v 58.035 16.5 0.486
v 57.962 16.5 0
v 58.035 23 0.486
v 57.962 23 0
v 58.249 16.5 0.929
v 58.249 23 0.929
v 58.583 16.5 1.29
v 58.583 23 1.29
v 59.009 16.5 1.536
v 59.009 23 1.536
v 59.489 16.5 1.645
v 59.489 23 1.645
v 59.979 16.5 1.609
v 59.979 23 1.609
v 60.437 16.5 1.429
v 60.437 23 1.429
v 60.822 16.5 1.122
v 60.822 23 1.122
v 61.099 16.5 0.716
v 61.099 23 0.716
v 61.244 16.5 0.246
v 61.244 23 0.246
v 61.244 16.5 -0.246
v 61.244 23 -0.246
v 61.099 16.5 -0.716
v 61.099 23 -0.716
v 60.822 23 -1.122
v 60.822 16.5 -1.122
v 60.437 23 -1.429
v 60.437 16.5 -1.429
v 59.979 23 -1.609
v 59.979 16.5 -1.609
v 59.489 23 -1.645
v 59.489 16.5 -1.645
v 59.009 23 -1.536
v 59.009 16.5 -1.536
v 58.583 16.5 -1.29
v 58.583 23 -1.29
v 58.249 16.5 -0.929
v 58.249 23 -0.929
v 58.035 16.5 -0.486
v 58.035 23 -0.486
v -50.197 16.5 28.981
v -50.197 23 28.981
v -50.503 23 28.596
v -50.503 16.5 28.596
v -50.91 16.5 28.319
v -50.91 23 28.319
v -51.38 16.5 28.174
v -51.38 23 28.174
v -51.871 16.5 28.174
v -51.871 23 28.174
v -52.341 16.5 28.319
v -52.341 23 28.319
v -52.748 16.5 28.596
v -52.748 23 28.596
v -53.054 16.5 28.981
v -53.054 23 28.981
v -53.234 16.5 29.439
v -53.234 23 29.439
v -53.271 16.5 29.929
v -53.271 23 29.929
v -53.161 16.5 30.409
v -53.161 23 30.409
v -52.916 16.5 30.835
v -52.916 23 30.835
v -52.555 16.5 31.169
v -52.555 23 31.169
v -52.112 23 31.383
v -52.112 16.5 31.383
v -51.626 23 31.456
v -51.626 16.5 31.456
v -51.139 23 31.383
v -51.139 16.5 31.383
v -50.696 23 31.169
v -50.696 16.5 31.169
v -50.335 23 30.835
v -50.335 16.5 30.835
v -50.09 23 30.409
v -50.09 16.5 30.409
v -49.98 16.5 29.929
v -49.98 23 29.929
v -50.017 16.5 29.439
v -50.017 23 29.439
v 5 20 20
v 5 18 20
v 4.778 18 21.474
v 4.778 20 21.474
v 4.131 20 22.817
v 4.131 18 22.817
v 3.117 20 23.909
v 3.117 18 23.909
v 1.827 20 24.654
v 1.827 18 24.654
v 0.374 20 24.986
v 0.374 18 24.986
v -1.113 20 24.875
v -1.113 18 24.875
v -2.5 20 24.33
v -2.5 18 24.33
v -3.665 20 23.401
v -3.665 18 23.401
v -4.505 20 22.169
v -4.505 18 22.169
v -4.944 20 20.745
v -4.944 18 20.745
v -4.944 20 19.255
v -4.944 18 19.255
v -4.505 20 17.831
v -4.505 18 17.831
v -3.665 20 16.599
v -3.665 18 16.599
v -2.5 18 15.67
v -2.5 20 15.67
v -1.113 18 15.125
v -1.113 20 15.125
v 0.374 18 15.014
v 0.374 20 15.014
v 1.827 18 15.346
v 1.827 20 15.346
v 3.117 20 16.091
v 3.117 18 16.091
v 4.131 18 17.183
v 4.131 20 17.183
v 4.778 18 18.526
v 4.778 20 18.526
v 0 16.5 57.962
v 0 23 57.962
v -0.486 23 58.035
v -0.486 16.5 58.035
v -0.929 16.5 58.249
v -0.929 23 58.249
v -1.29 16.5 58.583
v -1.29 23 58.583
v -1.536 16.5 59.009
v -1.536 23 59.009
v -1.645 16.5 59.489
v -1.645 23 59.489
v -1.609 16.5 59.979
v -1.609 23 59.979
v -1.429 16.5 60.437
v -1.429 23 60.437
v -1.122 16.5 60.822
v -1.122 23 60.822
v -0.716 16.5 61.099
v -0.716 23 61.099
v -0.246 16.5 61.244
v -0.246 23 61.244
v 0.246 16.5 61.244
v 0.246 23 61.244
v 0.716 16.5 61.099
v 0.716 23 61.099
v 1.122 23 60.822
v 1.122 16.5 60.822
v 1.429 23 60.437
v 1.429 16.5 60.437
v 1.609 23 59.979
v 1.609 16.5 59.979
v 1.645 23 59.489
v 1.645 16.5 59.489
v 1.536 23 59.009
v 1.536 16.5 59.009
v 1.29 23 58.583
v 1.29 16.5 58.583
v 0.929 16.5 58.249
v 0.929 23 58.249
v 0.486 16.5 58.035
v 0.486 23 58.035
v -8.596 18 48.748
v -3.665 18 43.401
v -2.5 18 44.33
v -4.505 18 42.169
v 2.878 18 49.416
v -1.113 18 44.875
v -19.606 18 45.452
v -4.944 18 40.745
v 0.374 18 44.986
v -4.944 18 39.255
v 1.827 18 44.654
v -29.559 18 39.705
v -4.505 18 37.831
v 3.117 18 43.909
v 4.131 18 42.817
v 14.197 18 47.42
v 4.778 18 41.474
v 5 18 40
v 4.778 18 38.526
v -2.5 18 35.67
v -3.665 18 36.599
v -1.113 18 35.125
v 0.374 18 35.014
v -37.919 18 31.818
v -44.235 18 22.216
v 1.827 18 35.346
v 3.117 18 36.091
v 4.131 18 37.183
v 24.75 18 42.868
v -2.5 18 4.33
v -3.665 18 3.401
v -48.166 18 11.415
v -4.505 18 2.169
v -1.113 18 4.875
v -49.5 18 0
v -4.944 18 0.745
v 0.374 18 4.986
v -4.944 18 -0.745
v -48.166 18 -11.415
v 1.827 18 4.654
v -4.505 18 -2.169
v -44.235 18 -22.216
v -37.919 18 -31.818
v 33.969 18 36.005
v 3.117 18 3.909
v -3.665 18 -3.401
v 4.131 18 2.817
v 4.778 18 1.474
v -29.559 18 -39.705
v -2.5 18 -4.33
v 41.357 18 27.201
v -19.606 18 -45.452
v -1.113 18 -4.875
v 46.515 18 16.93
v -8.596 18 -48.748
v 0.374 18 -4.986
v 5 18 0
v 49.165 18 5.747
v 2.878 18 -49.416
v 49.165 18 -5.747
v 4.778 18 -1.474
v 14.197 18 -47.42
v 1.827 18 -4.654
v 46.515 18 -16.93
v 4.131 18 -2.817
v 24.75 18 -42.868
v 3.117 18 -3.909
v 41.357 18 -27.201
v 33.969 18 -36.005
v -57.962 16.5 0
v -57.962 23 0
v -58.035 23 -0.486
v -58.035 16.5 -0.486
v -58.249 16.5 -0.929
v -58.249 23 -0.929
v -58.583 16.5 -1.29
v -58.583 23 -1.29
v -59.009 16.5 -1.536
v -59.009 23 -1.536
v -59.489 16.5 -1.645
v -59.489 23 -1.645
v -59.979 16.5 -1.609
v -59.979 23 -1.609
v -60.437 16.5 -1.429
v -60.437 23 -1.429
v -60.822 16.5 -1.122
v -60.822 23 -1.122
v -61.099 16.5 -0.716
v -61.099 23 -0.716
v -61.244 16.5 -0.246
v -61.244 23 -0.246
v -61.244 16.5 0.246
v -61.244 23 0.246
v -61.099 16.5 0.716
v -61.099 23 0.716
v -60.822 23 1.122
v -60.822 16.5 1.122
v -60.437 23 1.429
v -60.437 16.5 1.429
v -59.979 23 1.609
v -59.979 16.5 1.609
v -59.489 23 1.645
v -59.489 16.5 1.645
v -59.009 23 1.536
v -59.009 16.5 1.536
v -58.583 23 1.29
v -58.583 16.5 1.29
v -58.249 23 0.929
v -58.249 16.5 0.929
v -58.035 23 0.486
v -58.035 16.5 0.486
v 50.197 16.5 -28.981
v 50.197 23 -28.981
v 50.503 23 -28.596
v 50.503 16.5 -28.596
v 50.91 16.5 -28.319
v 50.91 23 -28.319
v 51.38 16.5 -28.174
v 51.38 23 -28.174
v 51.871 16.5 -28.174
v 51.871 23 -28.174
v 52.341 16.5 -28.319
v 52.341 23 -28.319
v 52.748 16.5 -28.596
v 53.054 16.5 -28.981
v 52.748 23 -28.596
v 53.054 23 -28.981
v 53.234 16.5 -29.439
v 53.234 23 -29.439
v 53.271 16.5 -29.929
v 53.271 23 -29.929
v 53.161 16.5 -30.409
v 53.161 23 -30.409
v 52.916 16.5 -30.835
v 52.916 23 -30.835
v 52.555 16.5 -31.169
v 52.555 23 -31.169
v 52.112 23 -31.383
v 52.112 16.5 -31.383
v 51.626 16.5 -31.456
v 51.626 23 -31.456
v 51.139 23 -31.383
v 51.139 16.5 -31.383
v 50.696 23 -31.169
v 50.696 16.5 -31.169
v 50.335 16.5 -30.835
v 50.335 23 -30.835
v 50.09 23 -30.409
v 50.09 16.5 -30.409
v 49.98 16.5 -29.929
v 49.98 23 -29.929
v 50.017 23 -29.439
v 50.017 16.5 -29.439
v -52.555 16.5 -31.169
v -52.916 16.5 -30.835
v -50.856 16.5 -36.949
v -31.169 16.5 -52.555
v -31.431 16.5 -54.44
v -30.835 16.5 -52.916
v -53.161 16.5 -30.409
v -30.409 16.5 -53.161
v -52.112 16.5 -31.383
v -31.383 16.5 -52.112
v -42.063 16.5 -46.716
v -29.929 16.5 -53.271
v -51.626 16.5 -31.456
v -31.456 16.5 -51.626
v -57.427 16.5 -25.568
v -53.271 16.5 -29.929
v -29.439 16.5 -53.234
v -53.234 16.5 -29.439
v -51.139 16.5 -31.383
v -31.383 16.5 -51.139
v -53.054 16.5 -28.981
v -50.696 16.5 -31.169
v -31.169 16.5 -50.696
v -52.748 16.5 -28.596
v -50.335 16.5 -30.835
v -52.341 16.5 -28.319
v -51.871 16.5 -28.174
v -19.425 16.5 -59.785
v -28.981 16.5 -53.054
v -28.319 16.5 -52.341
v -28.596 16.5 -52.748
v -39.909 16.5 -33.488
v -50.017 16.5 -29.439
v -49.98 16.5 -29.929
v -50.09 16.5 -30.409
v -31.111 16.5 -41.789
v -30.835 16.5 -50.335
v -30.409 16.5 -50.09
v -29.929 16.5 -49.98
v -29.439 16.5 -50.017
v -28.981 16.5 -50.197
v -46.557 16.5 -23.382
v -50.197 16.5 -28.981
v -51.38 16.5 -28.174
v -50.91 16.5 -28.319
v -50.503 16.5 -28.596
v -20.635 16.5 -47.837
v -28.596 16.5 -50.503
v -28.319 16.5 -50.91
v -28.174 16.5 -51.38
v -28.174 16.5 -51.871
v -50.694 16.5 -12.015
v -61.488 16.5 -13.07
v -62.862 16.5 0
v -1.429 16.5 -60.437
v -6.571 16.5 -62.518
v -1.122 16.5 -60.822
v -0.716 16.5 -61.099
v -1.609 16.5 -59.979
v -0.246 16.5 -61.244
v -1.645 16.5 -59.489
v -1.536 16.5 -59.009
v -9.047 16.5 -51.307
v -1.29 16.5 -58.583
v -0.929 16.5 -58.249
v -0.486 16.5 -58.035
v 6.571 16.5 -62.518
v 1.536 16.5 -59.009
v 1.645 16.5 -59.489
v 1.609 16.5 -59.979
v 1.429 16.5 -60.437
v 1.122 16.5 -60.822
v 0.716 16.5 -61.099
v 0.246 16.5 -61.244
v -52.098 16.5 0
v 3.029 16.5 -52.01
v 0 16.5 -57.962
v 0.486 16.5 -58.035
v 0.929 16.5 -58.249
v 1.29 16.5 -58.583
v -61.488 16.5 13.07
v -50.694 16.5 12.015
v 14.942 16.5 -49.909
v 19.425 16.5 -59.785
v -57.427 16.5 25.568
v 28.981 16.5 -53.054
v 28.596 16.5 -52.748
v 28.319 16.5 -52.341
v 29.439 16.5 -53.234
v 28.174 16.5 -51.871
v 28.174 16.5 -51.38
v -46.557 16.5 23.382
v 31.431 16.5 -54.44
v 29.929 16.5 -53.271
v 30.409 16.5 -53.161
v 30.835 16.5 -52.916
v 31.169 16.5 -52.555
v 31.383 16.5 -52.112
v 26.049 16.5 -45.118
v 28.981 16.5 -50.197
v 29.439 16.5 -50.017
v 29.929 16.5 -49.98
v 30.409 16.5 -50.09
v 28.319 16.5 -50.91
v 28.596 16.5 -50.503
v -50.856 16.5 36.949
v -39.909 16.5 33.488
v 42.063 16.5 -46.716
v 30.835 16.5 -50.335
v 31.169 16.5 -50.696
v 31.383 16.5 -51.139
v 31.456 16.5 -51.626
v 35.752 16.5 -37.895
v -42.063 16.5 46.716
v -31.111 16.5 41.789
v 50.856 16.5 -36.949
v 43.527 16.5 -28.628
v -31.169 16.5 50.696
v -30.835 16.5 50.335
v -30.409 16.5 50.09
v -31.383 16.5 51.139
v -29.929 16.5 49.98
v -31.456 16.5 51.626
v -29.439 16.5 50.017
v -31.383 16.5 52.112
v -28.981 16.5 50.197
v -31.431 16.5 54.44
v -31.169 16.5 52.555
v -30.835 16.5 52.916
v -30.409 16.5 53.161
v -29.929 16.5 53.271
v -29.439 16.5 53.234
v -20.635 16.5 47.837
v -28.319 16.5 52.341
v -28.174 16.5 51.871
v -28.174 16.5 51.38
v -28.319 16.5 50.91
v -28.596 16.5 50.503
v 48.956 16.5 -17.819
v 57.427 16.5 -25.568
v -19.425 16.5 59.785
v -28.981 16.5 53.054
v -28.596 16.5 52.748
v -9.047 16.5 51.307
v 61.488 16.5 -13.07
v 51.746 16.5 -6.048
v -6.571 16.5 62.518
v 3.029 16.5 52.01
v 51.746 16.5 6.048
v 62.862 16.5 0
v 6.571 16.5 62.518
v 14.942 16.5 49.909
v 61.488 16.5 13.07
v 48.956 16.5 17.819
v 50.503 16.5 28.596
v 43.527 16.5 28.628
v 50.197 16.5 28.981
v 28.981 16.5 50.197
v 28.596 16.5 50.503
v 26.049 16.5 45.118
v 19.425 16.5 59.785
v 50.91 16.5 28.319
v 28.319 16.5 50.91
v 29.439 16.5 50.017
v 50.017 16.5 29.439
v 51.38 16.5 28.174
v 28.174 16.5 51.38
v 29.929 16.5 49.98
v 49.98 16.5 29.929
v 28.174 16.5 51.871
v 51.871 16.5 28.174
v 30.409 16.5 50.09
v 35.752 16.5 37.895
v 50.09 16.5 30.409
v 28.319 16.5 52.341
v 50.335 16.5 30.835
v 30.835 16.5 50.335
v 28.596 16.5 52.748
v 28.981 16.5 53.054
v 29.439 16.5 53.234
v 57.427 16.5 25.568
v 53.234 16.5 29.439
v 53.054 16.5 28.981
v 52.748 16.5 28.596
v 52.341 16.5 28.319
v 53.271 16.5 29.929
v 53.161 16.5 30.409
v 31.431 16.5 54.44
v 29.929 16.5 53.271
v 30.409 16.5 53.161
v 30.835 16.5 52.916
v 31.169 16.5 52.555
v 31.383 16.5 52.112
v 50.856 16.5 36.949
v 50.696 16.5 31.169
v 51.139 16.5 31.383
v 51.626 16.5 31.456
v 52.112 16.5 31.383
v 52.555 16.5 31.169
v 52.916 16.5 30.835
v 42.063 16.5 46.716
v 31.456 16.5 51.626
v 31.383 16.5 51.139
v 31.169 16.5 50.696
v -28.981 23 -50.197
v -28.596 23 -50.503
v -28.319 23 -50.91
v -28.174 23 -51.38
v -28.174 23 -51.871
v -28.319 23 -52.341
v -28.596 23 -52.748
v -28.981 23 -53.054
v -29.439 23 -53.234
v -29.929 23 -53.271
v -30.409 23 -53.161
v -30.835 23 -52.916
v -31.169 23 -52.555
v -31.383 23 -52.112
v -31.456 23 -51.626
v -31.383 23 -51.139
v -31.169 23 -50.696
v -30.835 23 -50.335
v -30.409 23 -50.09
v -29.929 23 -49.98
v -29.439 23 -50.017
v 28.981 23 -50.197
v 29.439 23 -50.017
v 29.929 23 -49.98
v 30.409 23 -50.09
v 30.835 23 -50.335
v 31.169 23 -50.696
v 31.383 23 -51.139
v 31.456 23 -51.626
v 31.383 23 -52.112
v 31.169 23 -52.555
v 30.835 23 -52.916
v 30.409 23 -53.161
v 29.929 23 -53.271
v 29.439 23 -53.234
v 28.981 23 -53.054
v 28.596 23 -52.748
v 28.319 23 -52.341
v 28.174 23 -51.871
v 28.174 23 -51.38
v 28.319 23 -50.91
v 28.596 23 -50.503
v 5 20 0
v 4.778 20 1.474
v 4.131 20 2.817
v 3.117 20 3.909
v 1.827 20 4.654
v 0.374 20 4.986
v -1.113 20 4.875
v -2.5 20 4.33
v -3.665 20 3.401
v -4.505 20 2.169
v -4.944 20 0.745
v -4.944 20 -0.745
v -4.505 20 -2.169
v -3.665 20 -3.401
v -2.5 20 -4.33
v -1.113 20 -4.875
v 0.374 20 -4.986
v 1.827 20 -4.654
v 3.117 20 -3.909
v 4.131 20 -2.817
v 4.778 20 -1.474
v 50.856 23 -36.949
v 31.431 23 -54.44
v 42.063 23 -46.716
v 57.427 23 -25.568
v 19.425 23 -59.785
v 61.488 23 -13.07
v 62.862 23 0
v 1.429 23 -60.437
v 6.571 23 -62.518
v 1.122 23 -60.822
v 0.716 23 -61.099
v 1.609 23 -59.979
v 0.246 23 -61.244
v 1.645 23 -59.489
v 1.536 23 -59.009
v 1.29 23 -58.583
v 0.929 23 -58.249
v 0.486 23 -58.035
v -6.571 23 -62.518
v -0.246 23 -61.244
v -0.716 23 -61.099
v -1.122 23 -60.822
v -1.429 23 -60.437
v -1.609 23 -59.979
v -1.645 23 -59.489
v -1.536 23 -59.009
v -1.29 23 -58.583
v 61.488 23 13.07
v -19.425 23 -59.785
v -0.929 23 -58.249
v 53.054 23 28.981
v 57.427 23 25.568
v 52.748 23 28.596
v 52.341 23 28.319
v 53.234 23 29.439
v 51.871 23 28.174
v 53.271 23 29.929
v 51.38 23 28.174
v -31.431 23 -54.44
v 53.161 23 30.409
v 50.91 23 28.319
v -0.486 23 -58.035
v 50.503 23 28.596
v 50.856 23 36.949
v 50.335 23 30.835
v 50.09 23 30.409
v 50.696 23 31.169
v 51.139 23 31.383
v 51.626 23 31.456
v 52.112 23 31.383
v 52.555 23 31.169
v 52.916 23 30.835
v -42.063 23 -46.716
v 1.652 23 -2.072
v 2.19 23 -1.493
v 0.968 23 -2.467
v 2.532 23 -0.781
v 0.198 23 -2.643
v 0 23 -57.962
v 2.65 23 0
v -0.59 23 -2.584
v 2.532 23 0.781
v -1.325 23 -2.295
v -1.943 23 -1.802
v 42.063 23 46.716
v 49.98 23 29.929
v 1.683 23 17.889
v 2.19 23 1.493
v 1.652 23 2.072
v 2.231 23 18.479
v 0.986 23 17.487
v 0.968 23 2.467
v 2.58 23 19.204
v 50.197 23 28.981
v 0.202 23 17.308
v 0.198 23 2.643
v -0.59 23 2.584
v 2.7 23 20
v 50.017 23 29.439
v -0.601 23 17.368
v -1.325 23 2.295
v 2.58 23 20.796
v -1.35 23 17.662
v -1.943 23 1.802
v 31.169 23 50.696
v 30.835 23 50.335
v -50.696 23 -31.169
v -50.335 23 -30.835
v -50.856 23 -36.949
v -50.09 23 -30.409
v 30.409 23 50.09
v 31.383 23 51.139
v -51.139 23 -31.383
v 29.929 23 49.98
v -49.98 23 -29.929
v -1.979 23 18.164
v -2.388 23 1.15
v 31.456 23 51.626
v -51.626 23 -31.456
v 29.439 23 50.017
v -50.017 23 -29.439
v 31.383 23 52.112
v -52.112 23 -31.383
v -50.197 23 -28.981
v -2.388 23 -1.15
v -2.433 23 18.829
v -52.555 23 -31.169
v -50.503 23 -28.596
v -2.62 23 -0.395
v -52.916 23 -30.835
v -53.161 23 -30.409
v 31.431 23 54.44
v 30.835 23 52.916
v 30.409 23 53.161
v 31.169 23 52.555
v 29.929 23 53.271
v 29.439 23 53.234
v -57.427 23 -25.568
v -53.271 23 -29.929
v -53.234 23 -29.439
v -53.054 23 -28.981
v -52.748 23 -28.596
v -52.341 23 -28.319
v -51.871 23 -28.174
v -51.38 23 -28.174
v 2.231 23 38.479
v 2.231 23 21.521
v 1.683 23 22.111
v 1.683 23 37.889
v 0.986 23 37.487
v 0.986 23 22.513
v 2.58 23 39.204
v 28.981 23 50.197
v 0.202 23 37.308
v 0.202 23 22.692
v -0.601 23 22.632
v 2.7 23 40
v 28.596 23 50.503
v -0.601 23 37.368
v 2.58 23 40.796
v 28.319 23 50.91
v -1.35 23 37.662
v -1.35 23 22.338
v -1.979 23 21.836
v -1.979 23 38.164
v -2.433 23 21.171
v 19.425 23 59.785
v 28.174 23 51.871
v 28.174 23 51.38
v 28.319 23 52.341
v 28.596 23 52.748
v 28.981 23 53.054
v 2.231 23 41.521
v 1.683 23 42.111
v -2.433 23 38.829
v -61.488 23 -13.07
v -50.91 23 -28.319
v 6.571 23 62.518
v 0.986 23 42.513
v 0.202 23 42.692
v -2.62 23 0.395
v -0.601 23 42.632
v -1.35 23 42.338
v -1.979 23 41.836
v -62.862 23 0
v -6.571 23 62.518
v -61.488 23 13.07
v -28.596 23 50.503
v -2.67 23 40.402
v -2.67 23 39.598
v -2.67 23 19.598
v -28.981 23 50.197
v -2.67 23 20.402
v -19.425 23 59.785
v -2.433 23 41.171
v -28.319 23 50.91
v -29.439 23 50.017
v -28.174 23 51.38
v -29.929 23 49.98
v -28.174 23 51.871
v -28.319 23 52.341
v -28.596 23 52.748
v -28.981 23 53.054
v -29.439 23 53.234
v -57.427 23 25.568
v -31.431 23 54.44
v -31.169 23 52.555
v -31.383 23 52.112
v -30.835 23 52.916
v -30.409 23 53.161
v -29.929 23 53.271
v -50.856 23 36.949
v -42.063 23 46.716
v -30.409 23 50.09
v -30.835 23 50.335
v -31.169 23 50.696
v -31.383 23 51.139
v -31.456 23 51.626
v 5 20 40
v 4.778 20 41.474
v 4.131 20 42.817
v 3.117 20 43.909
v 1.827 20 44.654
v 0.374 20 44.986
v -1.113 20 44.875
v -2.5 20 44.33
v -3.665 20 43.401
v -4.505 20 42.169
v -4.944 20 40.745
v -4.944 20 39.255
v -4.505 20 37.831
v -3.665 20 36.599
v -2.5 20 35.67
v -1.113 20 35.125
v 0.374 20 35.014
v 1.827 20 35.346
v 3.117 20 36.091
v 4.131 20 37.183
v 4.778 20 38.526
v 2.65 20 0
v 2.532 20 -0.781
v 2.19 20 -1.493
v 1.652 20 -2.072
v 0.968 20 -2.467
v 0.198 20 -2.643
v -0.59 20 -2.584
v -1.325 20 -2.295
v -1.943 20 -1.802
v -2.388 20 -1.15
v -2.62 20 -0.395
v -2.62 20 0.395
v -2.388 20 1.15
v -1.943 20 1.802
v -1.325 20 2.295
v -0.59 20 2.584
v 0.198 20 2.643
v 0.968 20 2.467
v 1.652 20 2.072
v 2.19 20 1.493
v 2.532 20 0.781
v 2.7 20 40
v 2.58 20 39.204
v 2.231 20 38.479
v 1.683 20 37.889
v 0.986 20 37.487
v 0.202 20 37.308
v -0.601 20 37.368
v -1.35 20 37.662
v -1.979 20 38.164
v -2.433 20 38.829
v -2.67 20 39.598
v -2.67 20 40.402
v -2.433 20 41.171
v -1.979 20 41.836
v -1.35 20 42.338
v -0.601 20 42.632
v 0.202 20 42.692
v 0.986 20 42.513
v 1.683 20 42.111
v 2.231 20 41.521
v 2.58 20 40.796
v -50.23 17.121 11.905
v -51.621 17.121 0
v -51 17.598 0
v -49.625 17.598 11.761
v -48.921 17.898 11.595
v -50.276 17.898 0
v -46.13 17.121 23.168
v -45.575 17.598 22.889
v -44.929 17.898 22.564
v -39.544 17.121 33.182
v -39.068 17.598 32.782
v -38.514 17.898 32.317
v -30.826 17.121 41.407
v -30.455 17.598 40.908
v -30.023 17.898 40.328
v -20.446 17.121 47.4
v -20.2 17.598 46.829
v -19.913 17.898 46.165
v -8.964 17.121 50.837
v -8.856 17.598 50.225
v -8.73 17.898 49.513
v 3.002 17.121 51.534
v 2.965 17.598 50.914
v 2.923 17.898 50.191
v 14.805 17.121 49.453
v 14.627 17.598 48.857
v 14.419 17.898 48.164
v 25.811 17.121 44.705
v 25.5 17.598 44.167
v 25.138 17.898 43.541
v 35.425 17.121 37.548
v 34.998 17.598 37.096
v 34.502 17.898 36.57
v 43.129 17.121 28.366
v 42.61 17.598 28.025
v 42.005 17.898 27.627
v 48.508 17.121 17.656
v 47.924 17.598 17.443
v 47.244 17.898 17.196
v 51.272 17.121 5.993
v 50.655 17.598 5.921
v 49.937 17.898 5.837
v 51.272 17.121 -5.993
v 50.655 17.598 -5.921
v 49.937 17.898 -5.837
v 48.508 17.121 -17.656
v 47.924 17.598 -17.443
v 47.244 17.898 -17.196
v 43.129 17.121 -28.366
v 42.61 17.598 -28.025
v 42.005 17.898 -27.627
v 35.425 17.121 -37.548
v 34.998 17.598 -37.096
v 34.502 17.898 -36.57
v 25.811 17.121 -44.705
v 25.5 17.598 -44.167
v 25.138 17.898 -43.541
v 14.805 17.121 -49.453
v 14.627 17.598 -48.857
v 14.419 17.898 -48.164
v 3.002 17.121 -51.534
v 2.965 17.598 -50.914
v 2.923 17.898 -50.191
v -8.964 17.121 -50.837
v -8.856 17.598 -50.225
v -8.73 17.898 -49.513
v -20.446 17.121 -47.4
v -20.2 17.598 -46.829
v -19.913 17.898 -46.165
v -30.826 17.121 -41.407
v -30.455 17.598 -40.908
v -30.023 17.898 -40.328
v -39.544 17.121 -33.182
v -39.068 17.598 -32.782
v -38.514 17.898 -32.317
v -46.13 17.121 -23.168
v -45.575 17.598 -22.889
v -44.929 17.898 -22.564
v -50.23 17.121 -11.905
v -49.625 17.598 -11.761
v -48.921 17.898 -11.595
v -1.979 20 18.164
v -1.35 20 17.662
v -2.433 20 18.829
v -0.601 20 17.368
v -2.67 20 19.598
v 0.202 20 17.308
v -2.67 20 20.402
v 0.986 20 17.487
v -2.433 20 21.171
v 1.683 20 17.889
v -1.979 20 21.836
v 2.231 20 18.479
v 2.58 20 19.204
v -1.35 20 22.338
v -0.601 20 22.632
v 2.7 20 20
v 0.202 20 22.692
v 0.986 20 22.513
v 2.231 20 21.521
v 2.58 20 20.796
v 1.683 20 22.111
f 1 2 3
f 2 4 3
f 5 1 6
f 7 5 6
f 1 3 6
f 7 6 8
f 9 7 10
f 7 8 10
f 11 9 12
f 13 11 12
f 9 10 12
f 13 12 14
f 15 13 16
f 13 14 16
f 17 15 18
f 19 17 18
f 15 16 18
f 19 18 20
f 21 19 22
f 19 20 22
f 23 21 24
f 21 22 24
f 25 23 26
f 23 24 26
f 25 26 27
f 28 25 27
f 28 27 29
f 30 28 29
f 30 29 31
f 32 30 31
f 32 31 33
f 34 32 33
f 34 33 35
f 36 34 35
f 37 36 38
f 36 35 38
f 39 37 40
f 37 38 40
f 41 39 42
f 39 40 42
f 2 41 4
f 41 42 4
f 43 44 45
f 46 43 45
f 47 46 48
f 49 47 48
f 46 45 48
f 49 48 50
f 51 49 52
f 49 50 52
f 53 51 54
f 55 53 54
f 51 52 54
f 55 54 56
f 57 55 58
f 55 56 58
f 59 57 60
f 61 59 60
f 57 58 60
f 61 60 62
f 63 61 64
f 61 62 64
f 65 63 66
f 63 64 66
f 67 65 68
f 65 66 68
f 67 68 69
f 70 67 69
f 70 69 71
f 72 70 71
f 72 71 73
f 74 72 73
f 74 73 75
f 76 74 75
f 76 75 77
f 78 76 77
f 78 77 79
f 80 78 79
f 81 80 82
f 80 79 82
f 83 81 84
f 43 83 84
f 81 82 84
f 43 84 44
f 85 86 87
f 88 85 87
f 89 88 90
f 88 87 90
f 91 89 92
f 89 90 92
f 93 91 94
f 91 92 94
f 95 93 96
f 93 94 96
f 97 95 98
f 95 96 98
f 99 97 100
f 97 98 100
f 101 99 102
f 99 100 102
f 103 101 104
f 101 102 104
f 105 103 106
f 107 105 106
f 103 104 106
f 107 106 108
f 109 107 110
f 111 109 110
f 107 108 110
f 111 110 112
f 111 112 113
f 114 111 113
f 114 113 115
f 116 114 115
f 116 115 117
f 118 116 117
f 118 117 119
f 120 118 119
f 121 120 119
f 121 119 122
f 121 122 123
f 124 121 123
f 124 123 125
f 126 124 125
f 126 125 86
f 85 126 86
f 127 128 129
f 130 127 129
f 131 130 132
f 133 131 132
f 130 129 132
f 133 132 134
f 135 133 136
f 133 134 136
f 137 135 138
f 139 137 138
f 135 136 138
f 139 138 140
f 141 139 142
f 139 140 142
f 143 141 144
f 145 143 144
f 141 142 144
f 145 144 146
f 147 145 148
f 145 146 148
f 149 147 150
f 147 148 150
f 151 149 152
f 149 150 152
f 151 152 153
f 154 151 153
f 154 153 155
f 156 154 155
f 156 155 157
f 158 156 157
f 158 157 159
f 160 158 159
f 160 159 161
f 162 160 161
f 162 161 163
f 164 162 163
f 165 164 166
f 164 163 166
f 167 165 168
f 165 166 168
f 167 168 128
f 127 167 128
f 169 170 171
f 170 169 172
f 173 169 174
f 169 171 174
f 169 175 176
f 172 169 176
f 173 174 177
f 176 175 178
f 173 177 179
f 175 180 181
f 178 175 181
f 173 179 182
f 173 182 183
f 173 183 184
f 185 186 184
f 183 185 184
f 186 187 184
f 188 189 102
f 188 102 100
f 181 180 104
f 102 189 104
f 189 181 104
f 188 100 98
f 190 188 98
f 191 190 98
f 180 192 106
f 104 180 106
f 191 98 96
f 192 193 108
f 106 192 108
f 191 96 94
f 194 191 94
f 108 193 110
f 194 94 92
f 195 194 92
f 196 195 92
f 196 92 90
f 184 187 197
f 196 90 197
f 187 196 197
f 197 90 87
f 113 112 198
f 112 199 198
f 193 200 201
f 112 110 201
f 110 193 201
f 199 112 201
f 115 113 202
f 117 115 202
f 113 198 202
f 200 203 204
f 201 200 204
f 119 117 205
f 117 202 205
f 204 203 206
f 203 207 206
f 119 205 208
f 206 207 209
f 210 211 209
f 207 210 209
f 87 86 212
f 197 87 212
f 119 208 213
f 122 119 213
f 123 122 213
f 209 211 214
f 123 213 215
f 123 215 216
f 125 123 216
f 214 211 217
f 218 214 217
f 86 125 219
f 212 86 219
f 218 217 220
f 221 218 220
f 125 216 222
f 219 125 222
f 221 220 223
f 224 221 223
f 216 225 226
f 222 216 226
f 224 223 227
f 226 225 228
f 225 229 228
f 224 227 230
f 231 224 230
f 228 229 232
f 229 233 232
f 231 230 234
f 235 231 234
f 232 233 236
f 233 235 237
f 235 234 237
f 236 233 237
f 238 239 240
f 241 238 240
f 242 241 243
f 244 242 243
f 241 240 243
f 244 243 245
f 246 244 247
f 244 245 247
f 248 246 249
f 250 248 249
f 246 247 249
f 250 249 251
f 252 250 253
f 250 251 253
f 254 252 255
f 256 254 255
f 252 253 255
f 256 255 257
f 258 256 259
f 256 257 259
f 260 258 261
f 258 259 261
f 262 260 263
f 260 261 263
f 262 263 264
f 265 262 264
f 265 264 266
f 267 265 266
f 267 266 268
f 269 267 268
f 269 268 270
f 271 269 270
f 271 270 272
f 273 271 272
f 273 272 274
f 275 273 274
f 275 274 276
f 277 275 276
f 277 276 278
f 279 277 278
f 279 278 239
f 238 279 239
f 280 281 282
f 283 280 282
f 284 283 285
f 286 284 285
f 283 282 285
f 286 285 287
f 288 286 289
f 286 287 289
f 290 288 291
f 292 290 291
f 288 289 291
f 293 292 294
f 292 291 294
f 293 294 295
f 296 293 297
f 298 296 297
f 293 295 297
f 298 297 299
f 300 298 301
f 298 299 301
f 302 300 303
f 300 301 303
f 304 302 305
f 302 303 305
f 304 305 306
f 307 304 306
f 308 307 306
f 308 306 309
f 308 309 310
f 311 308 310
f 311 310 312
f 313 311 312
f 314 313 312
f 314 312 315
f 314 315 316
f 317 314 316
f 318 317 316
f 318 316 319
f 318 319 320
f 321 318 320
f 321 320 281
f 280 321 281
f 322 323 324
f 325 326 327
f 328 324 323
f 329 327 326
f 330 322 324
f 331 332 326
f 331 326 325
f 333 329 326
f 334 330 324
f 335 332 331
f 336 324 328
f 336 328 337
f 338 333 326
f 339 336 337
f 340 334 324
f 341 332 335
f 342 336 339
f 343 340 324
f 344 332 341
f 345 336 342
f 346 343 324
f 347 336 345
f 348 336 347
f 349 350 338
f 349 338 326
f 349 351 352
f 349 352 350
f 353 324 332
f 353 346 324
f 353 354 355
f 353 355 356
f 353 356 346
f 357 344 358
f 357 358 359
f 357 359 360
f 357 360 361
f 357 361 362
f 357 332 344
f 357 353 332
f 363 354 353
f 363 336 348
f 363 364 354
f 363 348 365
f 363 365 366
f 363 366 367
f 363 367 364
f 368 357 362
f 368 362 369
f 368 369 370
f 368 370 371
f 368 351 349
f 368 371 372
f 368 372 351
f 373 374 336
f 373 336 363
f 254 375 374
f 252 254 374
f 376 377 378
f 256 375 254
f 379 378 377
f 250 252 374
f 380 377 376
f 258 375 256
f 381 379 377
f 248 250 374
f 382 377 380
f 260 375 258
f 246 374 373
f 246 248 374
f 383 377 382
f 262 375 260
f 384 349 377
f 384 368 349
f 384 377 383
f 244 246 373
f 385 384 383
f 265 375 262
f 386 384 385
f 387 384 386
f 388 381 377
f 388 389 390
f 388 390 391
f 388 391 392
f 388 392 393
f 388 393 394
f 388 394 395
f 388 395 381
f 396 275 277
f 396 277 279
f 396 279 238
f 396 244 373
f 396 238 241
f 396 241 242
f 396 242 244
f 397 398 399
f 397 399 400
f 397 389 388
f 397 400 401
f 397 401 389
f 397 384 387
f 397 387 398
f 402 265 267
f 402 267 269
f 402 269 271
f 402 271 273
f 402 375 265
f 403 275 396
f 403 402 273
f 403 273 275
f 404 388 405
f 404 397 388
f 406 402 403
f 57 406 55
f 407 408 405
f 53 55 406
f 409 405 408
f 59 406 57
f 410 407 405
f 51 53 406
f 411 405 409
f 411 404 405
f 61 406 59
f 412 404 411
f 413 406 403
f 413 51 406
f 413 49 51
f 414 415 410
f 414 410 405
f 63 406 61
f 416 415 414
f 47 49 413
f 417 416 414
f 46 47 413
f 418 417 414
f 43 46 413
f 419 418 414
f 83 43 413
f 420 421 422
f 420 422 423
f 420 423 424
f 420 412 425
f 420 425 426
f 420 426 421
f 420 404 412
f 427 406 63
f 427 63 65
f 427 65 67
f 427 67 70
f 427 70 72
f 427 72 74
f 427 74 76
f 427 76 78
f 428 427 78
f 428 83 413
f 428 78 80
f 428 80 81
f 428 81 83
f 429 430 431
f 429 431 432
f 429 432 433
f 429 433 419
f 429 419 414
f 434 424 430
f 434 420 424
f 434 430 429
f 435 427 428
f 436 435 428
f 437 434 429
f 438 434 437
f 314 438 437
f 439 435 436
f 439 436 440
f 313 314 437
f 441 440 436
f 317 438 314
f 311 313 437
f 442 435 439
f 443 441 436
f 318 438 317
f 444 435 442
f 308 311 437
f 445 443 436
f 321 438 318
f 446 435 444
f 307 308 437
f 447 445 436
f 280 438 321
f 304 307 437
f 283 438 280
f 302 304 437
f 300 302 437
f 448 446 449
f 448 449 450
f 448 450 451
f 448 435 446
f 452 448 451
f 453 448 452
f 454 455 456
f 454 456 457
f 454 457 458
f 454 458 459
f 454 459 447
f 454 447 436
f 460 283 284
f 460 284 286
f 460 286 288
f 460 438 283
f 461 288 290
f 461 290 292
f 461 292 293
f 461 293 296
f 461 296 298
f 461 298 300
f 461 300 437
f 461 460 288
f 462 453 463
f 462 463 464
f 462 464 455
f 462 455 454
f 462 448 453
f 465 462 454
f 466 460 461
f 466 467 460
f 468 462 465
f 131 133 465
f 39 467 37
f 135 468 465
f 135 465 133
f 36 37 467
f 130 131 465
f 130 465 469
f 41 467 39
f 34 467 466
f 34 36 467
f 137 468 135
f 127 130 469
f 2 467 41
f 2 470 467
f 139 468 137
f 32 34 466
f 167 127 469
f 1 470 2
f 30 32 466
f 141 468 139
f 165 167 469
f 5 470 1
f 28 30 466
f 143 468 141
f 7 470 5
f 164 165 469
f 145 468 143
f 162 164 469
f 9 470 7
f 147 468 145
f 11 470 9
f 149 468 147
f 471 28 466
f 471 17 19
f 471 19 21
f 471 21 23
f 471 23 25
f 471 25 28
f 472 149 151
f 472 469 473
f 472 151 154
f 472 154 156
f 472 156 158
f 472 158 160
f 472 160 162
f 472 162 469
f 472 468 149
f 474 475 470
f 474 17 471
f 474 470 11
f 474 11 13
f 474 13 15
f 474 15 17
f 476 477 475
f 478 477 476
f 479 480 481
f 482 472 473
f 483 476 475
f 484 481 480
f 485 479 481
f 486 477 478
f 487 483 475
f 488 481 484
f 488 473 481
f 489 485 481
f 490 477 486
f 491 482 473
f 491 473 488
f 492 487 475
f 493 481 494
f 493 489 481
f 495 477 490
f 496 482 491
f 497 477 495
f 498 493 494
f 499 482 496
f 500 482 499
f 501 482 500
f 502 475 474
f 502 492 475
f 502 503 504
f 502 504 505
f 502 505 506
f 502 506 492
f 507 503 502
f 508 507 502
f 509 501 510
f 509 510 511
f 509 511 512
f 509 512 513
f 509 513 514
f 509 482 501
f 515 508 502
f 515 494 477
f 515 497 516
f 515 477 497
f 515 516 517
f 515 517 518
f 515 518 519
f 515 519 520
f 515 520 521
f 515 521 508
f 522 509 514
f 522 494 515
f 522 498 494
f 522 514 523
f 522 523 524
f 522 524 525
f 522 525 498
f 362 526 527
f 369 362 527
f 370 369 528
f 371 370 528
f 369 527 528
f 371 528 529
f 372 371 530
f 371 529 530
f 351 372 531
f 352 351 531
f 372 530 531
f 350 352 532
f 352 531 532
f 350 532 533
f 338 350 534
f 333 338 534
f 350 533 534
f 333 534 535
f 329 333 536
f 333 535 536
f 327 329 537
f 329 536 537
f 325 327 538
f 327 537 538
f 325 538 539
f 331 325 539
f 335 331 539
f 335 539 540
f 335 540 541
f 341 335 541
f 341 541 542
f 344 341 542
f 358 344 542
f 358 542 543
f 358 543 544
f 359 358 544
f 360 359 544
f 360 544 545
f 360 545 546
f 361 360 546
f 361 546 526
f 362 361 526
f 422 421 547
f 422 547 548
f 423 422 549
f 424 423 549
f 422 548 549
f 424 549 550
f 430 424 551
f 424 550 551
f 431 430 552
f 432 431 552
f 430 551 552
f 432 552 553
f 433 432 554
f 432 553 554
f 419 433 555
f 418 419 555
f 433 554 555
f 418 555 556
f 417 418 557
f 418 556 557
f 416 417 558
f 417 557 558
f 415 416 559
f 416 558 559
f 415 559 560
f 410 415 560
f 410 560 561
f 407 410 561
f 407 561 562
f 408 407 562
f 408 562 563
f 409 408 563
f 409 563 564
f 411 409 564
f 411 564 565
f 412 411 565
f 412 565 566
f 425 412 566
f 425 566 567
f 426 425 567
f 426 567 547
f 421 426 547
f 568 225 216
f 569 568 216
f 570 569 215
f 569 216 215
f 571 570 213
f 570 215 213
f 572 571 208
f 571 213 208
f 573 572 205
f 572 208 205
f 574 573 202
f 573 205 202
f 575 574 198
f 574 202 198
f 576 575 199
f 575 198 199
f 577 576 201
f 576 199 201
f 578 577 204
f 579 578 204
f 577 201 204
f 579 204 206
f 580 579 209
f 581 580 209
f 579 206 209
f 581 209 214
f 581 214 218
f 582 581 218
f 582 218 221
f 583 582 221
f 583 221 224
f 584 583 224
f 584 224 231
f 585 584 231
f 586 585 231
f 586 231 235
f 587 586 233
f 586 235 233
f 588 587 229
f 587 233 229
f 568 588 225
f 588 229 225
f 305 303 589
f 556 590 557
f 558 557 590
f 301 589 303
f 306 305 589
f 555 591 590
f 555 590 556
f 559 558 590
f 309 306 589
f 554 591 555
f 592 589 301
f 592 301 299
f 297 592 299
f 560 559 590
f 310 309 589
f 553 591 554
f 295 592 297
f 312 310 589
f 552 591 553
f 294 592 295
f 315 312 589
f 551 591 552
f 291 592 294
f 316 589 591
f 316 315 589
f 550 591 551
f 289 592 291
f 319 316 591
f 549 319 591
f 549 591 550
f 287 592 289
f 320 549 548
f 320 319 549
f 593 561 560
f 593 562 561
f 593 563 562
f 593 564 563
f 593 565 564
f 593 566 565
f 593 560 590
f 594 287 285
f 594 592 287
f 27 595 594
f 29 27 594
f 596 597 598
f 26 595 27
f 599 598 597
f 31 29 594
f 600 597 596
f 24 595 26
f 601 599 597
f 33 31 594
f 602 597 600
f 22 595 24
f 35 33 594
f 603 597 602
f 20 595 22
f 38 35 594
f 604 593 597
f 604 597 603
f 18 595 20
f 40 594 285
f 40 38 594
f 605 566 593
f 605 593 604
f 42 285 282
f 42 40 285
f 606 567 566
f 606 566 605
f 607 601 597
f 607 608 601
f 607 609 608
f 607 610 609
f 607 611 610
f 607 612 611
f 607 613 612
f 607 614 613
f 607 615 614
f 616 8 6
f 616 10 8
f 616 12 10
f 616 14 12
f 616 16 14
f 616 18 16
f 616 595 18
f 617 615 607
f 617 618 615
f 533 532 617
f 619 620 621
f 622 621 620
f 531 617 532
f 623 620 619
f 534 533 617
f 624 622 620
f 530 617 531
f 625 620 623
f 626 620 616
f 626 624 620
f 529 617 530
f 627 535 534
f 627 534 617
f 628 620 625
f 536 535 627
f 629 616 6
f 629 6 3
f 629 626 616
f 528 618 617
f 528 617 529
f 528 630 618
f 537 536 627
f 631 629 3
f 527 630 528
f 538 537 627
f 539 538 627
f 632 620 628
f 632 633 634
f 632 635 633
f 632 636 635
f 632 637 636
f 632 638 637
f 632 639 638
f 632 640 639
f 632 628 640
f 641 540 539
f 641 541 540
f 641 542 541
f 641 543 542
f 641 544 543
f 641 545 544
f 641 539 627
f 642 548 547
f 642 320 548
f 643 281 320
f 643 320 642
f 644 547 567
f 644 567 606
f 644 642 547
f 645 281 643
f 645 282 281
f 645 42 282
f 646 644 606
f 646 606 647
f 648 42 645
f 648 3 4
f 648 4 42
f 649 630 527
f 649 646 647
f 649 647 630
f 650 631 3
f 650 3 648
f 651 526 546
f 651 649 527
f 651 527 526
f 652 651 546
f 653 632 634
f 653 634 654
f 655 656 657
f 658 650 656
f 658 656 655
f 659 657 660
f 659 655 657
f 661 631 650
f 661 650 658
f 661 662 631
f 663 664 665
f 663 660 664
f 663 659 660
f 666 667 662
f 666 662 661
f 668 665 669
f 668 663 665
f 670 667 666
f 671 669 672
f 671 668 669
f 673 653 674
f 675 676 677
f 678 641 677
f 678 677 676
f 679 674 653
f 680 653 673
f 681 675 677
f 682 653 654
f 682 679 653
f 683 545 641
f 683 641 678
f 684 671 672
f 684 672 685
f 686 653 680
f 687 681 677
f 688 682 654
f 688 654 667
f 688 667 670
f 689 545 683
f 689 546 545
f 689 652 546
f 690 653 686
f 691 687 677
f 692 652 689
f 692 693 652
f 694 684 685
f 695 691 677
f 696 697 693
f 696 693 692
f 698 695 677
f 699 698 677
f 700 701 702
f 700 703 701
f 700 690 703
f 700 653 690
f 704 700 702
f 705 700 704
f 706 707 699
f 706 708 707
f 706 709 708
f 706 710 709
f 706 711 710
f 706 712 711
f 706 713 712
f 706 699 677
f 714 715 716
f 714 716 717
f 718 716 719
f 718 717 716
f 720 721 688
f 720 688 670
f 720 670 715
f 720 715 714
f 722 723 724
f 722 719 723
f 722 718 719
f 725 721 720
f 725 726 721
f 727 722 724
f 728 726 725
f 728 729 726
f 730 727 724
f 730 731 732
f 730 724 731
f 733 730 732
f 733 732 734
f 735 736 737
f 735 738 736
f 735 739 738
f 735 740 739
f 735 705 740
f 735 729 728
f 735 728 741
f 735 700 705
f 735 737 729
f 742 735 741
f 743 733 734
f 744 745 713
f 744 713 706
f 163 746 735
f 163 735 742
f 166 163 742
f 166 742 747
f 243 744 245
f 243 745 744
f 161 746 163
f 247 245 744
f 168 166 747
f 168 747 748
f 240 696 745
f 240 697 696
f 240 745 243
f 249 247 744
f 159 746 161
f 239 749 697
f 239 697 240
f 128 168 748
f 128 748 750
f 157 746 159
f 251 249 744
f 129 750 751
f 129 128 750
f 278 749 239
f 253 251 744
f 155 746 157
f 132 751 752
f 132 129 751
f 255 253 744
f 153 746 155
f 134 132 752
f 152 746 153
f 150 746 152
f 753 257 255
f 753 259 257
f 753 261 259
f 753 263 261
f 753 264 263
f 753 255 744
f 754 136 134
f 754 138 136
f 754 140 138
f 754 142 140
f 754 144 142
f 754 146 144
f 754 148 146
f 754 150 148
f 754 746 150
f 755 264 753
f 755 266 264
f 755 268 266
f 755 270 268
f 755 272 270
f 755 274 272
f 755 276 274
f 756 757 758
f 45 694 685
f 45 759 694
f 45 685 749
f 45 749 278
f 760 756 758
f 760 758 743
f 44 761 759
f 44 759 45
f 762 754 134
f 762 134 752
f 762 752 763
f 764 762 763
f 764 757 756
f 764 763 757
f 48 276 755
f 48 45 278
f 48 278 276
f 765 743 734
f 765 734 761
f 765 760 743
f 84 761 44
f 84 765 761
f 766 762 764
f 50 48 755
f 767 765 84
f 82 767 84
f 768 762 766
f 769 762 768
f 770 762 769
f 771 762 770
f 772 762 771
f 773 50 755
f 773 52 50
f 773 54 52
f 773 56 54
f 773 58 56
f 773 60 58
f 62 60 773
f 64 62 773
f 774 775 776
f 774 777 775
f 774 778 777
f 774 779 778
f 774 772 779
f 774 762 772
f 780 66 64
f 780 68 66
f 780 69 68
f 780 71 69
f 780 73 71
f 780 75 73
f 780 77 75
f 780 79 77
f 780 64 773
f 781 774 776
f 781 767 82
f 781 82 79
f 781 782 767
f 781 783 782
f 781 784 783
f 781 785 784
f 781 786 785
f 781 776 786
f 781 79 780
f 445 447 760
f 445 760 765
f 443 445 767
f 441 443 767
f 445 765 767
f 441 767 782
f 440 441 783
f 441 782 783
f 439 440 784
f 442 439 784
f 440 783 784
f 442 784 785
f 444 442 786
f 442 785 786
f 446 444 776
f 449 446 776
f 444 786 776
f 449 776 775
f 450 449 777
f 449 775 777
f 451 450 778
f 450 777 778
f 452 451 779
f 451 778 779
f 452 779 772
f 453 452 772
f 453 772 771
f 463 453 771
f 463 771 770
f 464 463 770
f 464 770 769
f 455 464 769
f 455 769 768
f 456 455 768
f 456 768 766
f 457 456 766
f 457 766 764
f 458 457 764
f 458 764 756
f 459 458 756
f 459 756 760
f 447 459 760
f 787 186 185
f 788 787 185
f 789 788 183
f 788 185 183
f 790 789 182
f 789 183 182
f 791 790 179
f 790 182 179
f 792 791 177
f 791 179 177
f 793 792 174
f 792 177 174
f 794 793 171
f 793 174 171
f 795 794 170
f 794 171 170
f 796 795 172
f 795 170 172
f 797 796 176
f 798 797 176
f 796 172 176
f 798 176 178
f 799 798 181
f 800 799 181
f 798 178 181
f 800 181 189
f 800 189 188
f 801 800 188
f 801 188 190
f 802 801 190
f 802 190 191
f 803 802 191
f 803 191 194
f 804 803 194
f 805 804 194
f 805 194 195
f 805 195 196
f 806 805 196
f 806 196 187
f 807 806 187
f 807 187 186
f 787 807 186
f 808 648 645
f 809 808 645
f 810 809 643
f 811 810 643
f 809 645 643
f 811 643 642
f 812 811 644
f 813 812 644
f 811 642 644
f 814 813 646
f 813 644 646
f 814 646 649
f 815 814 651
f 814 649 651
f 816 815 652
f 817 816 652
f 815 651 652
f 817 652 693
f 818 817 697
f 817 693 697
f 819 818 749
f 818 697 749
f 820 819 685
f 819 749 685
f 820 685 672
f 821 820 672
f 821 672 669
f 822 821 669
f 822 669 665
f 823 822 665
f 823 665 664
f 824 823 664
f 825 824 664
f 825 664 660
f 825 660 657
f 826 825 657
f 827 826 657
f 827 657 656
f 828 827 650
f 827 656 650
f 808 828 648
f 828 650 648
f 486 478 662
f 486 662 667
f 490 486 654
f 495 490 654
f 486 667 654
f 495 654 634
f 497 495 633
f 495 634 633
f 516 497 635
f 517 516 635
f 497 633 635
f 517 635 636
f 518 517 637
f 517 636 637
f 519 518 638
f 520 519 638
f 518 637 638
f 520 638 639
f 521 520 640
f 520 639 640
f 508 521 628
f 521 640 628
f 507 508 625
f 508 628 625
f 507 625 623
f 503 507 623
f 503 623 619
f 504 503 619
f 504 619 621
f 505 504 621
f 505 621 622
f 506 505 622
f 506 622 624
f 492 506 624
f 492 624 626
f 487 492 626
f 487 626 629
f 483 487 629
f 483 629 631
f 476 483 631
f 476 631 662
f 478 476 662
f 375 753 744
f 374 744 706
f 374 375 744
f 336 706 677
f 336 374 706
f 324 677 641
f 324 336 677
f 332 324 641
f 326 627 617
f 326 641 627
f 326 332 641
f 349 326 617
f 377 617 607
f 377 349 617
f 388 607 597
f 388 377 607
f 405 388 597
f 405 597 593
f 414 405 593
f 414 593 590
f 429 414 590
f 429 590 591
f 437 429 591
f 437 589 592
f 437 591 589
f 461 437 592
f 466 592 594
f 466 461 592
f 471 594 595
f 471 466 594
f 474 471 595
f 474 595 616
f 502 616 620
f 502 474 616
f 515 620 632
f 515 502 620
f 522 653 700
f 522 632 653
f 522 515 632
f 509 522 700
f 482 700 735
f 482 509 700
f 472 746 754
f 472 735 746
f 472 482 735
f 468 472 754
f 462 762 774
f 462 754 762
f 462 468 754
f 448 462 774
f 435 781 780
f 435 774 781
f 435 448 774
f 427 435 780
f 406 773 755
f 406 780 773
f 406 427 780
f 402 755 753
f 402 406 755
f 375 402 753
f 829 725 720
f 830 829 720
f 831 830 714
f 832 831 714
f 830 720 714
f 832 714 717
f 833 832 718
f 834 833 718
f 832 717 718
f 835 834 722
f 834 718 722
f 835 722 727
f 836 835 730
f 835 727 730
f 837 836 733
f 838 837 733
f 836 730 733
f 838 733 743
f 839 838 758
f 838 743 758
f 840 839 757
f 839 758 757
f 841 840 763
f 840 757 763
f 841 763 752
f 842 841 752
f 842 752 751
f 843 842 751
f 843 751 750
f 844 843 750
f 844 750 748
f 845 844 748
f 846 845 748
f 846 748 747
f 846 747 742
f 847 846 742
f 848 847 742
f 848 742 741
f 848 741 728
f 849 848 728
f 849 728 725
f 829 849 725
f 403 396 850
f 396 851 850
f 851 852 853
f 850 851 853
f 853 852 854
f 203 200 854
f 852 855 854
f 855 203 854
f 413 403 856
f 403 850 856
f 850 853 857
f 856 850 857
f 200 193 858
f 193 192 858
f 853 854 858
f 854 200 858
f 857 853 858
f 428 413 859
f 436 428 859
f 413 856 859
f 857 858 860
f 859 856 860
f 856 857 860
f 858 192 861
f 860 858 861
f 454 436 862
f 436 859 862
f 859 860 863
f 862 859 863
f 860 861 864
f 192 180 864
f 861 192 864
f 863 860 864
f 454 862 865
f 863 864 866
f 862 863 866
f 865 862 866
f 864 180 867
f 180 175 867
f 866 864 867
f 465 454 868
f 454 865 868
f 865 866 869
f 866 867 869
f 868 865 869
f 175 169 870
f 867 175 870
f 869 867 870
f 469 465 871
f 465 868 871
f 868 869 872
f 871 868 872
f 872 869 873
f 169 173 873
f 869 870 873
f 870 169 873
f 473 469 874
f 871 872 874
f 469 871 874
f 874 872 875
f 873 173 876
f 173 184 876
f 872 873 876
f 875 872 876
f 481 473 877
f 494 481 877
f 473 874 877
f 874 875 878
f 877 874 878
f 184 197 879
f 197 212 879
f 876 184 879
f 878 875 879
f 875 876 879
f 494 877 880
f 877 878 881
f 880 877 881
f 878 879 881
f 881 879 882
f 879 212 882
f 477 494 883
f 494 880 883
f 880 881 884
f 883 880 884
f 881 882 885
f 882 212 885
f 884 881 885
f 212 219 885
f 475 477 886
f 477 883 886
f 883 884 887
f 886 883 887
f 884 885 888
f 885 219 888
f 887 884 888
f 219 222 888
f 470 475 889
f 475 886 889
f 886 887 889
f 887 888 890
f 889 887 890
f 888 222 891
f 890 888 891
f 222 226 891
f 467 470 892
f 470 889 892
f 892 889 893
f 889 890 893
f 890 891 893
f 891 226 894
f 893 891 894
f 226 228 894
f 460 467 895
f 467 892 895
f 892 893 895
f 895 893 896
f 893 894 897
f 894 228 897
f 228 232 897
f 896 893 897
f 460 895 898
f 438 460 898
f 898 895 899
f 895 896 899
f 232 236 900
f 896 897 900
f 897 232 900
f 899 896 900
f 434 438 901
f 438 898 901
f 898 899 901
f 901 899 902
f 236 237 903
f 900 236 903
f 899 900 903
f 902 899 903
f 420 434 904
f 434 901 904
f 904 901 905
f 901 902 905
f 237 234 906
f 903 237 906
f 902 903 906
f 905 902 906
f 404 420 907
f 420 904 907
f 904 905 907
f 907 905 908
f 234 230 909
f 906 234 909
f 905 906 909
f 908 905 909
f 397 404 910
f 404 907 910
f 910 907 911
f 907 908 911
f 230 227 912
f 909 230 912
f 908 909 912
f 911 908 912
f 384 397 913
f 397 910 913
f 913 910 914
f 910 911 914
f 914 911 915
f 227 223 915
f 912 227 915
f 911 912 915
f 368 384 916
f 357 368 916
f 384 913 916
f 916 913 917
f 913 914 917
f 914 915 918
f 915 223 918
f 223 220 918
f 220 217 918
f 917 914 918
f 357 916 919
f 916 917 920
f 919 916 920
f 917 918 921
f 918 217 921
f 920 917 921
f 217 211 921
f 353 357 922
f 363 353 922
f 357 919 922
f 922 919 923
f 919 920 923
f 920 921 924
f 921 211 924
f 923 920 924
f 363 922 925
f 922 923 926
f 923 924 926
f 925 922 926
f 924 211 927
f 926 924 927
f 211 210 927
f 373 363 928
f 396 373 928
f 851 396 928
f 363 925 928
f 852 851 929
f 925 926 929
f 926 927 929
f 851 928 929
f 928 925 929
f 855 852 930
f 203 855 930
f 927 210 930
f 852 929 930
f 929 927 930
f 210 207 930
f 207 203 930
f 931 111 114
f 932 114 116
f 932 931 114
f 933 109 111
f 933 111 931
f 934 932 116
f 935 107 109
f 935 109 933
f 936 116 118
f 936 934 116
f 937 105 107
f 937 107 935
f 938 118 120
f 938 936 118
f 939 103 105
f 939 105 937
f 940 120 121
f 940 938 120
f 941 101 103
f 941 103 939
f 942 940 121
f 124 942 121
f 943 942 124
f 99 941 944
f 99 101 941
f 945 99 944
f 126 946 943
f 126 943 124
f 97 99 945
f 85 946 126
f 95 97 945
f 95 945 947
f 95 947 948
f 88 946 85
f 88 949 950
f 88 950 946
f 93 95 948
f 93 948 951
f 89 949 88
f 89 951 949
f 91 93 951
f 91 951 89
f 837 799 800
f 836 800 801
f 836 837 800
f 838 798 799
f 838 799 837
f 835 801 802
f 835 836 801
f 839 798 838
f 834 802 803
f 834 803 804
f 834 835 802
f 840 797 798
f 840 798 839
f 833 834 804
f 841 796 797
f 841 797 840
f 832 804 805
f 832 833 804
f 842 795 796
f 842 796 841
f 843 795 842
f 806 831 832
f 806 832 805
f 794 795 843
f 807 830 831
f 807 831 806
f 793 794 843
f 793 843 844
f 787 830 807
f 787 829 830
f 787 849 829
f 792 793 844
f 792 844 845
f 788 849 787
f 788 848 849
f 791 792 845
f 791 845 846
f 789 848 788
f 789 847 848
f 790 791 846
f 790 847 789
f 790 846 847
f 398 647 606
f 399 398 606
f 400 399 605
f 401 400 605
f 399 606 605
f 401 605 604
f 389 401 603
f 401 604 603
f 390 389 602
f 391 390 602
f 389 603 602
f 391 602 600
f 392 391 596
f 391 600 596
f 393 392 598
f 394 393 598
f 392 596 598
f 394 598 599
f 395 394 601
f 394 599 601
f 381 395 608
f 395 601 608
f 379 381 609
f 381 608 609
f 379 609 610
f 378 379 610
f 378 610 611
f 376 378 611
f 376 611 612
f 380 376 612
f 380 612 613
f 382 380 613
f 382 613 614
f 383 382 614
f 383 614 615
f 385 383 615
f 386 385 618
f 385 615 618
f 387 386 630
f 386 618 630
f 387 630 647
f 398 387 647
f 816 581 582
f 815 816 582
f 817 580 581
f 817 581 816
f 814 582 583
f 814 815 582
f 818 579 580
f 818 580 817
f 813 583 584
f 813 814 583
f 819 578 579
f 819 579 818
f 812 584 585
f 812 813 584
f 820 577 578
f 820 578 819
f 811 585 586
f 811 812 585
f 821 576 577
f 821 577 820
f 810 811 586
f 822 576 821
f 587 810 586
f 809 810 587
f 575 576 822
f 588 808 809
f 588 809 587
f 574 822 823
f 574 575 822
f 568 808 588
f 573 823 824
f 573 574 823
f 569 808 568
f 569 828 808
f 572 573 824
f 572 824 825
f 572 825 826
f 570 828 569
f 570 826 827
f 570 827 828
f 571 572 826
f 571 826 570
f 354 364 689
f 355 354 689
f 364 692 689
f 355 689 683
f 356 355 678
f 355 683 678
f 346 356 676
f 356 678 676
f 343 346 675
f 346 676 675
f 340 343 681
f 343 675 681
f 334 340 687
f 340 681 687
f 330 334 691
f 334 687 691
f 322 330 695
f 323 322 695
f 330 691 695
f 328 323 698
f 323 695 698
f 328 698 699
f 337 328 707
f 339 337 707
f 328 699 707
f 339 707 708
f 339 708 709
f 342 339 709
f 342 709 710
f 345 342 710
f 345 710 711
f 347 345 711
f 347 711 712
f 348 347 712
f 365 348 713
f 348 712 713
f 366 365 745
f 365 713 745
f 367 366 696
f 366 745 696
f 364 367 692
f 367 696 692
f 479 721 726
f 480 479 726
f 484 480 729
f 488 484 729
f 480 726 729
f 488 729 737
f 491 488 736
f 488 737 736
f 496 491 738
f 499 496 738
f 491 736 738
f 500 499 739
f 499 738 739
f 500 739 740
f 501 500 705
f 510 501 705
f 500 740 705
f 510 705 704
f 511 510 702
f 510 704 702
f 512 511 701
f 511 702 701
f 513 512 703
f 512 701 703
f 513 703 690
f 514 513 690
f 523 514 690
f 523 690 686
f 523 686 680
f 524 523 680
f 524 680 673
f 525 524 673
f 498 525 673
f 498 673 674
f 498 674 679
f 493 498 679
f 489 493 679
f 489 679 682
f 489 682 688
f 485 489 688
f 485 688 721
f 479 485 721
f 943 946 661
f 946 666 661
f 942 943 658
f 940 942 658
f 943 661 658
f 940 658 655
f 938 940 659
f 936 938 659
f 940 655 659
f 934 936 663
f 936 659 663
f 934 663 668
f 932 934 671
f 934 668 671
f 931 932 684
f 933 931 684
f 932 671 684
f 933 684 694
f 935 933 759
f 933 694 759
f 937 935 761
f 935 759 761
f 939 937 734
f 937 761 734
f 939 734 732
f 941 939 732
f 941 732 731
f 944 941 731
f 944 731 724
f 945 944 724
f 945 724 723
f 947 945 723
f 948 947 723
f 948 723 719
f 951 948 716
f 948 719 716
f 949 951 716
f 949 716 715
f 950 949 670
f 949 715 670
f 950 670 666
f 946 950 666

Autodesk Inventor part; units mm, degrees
ref_plane "YZ Plane" through (0, 0, 0) normal (1, 0, 0) x (0, 1, 0)
ref_plane "XZ Plane" through (0, 0, 0) normal (0, 1, 0) x (-1, 0, 0)
ref_plane "XY Plane" through (0, 0, 0) normal (0, 0, 1) x (1, 0, 0)
sketch "Boceto1" plane through (0, 0, 0) normal (0, 1, 0) x (-1, 0, 0)
  circle A0 centre (0, 0) radius 62.862
  circle A1 centre (0, 0) radius 52.5
  dimension "d0" = 125.724
  dimension "d1" = 105
extrude "Extrusión1" add sketch "Boceto1" along normal blind 23
sketch "Boceto2" plane through (0, 23, 0) normal (0, 1, 0) x (1, 0, 0)
  circle A0 centre (0, 0) radius 52.5 projected
extrude "Extrusión2" add sketch "Boceto2" against normal blind 5
sketch "Boceto3" plane through (0, 23, 0) normal (0, 1, 0) x (1, 0, 0)
  circle A0 centre (0, 0) radius 2.65
  dimension "d6" = 5.3
extrude "Extrusión3" cut sketch "Boceto3" against normal through all
sketch "Boceto4" plane through (0, 23, 0) normal (0, 1, 0) x (1, 0, 0)
  circle A0 centre (-59.612, 0) radius 1.65
  point P0 (0, 0)
  dimension "d9" = 3.3
  dimension "d10" = 59.612
extrude "Extrusión4" cut sketch "Boceto4" against normal through all
pattern_circular "Patrón circular1" count 12 over 360 about axis through (0, 0, 0) along (0, 1, 0) of "Extrusión4"
fillet "Empalme1" radius 3 1 edges at (52.5, 18, 0)
sketch "Boceto6" plane through (0, 23, 0) normal (0, 1, 0) x (1, 0, 0)
  circle A0 centre (0, -59.612) radius 1.65 projected
  circle A1 centre (0, -59.612) radius 2.85
  line L0 (1.6454, -62.462) -> (-1.6454, -62.462)
  line L1 (-1.6454, -62.462) -> (-3.2909, -59.612)
  line L2 (-3.2909, -59.612) -> (-1.6454, -56.762)
  line L3 (-1.6454, -56.762) -> (1.6454, -56.762)
  line L4 (1.6454, -56.762) -> (3.2909, -59.612)
  line L5 (3.2909, -59.612) -> (1.6454, -62.462)
  point P0 (0, 0)
  dimension "d20" = 5.7
extrude "Extrusión6" [suppressed]
pattern_circular "Patrón circular2" [suppressed]
sketch "Boceto10" plane through (0, 0, 0) normal (0, -1, 0) x (1, 0, 0)
  circle A0 centre (0, 0) radius 2.65 projected
  circle A1 centre (0, 0) radius 81.3362
extrude "Extrusión10" cut sketch "Boceto10" against normal blind 16.5
sketch "Boceto11" plane through (0, 23, 0) normal (0, 1, 0) x (1, 0, 0)
  circle A0 centre (0, -20) radius 2.7
  circle A1 centre (0, -40) radius 2.7
  point P0 (0, 0)
  dimension "d40" = 5.4
  dimension "d41" = 20
  dimension "d42" = 20
extrude "Extrusión11" cut sketch "Boceto11" against normal through all
sketch "Boceto12" plane through (0, 18, 0) normal (0, -1, 0) x (1, 0, 0)
  circle A0 centre (0, 0) radius 2.65 projected
  circle A1 centre (0, 0) radius 5
  circle A2 centre (0, 20) radius 2.7 projected
  circle A3 centre (0, 20) radius 5
  circle A4 centre (0, 40) radius 2.7 projected
  circle A5 centre (0, 40) radius 5
  dimension "d45" = 10
extrude "Extrusión12" cut sketch "Boceto12" against normal blind 2 contours A0 | A1 | A2 | A3 | A4 | A5
sketch "Boceto9" plane through (0, 18, 0) normal (0, -1, 0) x (1, 0, 0)
  circle A0 centre (0, 0) radius 2.65 projected
  circle A1 centre (0, 0) radius 74.2803
sketch "Boceto8" plane through (0, 0, 0) normal (0, -1, 0) x (1, 0, 0)
  circle A0 centre (0, 0) radius 2.65 projected
  circle A1 centre (0, 0) radius 69.5586
sketch "Boceto7" plane through (0, 0, 0) normal (0, -1, 0) x (1, 0, 0)
  line L0 (0, 0) -> (-67.2382, 47.1765)
  line L1 (-67.2382, 47.1765) -> (-46.5407, 66.6024)
  circle A0 centre (0, 0) radius 2.65 projected
  line L2 (-46.5407, 66.6024) -> (0, 0)
  line L3 (0, 0) -> (-86.5562, 0)
  line L4 (0, 0) -> (-56.8894, 56.8894)
  point P0 (-1.5179, 2.1722)
  point P1 (-2.1693, 1.5221)
  dimension "d26" = 20
  dimension "d28" = 45
properties part number "Platform"
